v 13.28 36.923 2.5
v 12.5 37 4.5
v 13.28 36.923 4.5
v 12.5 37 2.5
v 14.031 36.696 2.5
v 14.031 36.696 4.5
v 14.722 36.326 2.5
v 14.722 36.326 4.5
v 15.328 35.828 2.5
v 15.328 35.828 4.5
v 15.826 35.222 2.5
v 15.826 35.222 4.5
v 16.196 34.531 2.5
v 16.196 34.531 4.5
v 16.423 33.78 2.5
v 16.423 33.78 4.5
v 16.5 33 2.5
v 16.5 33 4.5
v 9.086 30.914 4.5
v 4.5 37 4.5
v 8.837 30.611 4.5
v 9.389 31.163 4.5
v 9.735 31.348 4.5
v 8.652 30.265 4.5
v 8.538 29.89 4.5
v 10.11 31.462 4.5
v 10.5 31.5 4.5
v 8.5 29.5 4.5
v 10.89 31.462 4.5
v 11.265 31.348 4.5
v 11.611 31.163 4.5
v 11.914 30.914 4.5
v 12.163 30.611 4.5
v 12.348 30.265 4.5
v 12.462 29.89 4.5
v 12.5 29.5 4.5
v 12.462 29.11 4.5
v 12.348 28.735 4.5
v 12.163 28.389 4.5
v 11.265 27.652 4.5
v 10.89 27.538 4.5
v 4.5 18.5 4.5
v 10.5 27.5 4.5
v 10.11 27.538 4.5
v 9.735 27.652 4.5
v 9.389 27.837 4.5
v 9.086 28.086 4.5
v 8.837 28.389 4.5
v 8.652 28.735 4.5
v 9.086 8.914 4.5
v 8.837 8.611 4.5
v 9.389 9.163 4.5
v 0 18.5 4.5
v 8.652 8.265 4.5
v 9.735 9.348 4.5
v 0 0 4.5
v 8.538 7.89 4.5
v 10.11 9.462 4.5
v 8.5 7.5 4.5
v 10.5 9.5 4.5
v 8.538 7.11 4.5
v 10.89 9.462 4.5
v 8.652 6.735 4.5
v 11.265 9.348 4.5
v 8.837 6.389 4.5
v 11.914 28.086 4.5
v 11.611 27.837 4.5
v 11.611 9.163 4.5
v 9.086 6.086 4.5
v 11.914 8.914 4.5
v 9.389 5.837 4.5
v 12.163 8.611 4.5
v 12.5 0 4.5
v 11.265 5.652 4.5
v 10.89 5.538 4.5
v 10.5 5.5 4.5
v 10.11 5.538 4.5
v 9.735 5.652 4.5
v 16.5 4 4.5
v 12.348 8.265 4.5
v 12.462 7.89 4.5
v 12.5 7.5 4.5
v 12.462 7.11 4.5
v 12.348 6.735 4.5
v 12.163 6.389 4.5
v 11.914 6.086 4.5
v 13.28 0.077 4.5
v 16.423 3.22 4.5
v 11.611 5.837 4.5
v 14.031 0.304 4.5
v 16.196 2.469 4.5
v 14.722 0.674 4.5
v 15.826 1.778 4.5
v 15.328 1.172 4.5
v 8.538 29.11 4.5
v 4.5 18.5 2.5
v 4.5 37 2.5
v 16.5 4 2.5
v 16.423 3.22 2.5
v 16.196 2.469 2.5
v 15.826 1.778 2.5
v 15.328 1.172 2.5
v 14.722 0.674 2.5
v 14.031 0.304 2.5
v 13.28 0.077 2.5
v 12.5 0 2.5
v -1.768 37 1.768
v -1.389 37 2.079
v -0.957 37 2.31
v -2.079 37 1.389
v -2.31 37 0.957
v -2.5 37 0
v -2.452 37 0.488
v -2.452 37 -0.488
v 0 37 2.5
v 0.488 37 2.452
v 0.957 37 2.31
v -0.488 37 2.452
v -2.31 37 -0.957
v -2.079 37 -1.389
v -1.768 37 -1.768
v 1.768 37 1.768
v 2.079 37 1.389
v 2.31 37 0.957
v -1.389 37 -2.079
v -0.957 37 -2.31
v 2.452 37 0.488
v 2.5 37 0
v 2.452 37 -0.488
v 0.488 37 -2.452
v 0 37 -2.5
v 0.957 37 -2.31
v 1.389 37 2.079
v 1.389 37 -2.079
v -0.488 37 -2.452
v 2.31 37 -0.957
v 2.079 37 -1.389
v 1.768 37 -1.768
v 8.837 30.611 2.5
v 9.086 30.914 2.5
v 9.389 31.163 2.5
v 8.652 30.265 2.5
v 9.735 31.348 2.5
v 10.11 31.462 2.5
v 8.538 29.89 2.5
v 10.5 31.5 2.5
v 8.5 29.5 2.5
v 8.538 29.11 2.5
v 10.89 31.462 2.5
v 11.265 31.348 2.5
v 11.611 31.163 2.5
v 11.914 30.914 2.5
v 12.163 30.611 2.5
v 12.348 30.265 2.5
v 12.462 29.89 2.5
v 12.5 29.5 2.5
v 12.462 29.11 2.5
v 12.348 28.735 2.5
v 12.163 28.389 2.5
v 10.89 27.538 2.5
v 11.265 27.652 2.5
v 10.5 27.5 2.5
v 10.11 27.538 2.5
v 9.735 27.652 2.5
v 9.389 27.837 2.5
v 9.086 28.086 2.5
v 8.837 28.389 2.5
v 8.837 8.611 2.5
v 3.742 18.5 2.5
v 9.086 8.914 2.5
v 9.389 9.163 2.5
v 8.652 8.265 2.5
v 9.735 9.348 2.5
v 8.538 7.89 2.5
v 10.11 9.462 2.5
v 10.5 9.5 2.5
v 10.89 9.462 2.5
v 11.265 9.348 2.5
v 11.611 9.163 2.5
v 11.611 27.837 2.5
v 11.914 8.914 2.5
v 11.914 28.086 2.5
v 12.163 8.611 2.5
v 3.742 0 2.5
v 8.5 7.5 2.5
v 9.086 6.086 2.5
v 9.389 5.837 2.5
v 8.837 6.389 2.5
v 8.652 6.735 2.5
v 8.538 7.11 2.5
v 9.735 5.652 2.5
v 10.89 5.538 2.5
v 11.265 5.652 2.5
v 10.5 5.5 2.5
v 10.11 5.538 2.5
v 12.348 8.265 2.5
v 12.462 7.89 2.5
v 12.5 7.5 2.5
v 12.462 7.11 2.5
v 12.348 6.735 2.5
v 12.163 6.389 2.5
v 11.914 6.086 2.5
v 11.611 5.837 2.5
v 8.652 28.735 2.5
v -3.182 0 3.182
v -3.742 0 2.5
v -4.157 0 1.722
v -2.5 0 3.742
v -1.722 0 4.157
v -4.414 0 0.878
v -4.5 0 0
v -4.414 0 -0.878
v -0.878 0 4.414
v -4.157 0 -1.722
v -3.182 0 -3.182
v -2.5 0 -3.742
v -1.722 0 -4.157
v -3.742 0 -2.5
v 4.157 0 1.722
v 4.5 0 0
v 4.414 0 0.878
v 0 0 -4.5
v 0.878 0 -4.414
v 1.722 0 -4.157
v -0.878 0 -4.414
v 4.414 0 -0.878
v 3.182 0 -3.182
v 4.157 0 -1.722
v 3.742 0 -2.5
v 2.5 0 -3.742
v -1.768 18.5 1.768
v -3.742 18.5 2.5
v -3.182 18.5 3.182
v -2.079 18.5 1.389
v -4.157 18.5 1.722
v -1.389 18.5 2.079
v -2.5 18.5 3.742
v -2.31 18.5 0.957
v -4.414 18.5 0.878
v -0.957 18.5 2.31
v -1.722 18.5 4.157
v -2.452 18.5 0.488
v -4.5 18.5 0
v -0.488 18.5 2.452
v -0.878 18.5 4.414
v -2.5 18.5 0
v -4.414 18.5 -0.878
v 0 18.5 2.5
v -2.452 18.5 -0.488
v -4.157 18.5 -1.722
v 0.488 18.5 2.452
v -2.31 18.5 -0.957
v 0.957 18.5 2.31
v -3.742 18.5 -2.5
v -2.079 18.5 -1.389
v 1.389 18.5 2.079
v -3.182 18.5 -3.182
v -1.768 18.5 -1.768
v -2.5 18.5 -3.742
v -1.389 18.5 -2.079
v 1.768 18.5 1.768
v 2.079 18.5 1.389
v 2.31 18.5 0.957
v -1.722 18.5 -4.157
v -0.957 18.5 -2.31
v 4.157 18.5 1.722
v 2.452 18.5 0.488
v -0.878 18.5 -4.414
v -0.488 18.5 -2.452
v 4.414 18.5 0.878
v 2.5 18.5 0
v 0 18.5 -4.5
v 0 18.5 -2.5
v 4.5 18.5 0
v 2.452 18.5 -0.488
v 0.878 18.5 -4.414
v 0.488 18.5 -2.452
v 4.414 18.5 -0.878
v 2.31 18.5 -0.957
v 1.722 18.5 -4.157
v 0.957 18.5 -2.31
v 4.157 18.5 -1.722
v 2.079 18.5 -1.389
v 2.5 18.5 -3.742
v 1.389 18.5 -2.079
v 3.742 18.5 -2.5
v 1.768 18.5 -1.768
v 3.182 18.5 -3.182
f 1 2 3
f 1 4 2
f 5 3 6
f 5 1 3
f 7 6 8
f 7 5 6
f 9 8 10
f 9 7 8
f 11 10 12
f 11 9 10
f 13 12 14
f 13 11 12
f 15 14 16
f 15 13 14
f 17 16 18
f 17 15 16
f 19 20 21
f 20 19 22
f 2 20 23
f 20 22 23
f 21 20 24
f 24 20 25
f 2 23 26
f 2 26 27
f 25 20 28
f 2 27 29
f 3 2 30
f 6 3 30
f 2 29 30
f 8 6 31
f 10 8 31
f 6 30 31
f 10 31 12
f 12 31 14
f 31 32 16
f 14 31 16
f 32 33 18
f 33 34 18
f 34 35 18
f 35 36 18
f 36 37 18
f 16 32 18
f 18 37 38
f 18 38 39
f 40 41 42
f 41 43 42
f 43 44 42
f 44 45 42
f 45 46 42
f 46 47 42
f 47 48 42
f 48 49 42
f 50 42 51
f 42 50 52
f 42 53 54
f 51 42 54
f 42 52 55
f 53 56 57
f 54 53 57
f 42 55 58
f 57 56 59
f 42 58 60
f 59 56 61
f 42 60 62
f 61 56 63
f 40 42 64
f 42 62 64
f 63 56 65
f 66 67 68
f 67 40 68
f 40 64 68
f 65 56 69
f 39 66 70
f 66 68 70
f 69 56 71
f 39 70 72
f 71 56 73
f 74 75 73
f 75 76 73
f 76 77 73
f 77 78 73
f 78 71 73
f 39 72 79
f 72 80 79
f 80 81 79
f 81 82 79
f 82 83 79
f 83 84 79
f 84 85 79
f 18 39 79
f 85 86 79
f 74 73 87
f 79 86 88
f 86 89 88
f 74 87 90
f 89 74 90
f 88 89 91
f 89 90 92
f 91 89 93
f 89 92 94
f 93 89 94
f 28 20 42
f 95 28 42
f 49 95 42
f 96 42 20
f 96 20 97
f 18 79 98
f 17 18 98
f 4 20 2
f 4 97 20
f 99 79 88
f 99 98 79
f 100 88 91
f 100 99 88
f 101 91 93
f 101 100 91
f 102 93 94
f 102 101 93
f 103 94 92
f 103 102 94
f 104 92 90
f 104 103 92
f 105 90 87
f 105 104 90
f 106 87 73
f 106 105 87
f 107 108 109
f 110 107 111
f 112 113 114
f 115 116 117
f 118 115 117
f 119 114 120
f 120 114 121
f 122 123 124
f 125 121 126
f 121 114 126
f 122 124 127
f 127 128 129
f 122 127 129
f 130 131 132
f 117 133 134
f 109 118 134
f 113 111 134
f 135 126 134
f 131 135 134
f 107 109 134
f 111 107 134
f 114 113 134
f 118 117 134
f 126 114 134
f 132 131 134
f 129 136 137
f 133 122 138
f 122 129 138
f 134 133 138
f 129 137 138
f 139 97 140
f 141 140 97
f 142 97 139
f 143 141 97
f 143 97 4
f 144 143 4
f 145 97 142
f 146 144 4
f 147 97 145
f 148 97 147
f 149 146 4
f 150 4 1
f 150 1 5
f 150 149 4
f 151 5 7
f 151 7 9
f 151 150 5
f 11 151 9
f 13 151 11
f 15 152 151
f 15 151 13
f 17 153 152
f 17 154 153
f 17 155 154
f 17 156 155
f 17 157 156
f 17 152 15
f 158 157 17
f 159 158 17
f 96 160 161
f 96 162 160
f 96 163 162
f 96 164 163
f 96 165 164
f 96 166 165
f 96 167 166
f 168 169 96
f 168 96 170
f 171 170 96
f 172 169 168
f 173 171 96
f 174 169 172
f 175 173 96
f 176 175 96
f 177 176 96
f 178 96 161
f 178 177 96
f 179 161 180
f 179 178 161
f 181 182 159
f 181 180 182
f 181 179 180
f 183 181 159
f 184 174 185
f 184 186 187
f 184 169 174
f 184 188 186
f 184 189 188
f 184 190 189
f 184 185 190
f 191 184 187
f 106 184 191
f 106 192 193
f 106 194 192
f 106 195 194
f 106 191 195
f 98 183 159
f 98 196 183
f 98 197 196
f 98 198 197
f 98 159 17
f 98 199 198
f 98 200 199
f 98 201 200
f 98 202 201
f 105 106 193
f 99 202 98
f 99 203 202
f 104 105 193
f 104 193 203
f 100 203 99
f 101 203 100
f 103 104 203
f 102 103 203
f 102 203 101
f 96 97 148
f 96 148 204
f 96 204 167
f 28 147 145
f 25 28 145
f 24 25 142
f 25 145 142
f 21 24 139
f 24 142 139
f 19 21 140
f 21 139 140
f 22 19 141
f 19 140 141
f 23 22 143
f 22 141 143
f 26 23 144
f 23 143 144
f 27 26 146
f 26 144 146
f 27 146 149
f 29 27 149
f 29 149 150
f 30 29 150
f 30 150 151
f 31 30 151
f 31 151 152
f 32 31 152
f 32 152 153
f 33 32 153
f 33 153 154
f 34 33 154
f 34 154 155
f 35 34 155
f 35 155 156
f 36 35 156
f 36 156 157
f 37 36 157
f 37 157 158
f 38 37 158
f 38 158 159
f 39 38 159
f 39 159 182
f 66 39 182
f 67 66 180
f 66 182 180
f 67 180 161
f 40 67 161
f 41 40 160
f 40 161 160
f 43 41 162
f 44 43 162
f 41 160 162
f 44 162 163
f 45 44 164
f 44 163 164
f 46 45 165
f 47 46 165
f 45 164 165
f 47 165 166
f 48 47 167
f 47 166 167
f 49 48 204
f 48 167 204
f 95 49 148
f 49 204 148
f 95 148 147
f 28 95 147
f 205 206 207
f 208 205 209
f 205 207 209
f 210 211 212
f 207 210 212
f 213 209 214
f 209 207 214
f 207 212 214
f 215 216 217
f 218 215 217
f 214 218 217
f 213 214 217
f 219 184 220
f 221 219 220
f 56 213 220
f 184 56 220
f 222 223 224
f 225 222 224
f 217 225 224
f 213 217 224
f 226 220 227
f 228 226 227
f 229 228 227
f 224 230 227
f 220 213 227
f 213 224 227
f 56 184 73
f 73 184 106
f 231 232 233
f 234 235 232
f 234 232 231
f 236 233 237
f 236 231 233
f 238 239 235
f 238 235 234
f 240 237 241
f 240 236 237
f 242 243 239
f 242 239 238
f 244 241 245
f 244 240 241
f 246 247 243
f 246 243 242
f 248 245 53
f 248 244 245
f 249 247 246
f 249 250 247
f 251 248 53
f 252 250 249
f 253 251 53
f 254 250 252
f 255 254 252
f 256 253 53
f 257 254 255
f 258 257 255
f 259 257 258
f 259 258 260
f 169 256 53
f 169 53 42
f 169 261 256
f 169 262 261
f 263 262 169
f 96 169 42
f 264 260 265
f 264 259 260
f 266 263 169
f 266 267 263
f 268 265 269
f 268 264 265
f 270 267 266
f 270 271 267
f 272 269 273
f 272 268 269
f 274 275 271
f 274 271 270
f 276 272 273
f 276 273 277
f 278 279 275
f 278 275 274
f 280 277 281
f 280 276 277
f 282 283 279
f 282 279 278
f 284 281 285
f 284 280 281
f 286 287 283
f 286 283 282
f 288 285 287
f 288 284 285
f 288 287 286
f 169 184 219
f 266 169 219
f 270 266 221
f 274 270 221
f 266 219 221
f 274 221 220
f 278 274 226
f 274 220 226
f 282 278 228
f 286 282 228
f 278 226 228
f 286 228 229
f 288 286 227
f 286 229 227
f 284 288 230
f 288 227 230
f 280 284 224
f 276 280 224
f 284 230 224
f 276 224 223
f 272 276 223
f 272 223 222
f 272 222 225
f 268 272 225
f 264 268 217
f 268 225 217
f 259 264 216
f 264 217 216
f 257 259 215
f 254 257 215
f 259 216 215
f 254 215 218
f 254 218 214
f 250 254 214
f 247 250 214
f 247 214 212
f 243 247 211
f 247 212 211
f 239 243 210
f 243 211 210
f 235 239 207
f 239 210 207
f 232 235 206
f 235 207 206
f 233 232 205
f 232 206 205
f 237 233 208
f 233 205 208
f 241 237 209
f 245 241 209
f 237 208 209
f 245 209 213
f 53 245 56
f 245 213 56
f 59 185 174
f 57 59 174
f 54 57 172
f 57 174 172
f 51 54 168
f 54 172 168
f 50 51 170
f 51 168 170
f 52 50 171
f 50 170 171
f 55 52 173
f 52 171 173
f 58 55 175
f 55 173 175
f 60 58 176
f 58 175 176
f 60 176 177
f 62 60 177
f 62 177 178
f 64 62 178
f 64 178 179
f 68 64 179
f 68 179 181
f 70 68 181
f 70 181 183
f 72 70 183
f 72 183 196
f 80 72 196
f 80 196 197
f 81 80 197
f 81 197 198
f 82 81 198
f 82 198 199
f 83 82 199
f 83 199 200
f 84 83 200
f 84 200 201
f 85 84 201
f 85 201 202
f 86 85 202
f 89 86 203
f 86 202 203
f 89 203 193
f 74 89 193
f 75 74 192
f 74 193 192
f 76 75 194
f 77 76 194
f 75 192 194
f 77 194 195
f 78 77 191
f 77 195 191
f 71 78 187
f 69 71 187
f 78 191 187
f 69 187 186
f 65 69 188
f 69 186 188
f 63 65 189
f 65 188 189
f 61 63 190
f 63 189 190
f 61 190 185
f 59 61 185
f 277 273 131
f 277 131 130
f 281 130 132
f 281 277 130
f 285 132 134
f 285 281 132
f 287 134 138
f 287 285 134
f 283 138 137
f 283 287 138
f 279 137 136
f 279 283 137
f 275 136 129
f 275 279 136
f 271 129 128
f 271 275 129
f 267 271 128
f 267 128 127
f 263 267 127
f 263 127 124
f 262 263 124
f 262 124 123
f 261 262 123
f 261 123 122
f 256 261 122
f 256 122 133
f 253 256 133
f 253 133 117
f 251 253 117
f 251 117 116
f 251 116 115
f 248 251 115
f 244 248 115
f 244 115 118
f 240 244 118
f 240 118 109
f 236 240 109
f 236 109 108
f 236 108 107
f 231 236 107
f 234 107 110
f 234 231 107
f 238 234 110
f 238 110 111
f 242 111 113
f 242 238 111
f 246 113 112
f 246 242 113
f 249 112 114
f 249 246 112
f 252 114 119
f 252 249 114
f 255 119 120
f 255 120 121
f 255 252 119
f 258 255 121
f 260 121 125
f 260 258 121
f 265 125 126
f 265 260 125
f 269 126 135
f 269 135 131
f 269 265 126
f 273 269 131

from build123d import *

# Parameters (mm, degrees)
SKETCH_1_R          = 2.5
EXTRUDE_1_DEPTH     = 18.5
SKETCH_2_W          = 12
SKETCH_2_H          = 2
EXTRUDE_2_DEPTH     = 18.5
CUT_EXTRUDE_1_REACH = 43.113
SKETCH_3_R          = 2
FILLET_1_R          = 4
SKETCH_4_R          = 2.5
EXTRUDE_3_DEPTH     = 37


with BuildPart() as part:
    # 草图1 → 凸台-拉伸1 (new body)
    with BuildSketch(Plane(origin=(0, 0, 0), x_dir=(1, 0, 0), z_dir=(0, 1, 0))):
        with BuildLine():
            Line((0, -4.5), (16.5, -4.5))
            Line((16.5, -4.5), (16.5, -2.5))
            Line((16.5, -2.5), (3.741657387, -2.5))
            ThreePointArc((3.741657387, -2.5), (-2.121320344, 3.968626967), (0, -4.5))
        make_face()
        with Locations(Location((0, 0, 0), (0, 0, 270))):
            Circle(SKETCH_1_R, mode=Mode.SUBTRACT)
    extrude(amount=EXTRUDE_1_DEPTH)

    # 草图2 → 凸台-拉伸2 (add)
    with BuildSketch(Plane(origin=(0, 18.5, 0), x_dir=(1, 0, 0), z_dir=(0, 1, 0))):
        with Locations((10.5, -3.5)):
            Rectangle(SKETCH_2_W, SKETCH_2_H)
    extrude(amount=EXTRUDE_2_DEPTH)

    # 草图3 → 切除-拉伸1 (cut, up to next)
    with BuildSketch(Plane(origin=(0, 0, 2.5), x_dir=(-1, 0, 0), z_dir=(0, 0, -1)), mode=Mode.PRIVATE) as cut_extrude_1_sk1:
        with Locations((-10.5, 7.5)):
            Circle(SKETCH_3_R)
    cut_extrude_1_tool1 = extrude(cut_extrude_1_sk1.sketch, amount=-CUT_EXTRUDE_1_REACH, mode=Mode.PRIVATE) & part.part
    # 草图3 → 切除-拉伸1 (cut, up to next)
    with BuildSketch(Plane(origin=(0, 0, 2.5), x_dir=(-1, 0, 0), z_dir=(0, 0, -1)), mode=Mode.PRIVATE) as cut_extrude_1_sk2:
        with Locations((-10.5, 29.5)):
            Circle(SKETCH_3_R)
    cut_extrude_1_tool2 = extrude(cut_extrude_1_sk2.sketch, amount=-CUT_EXTRUDE_1_REACH, mode=Mode.PRIVATE) & part.part
    add(cut_extrude_1_tool1.solids().sort_by_distance((10.5, 7.5, 2.5))[0], mode=Mode.SUBTRACT)
    add(cut_extrude_1_tool2.solids().sort_by_distance((10.5, 29.5, 2.5))[0], mode=Mode.SUBTRACT)

    # 圆角1
    fillet_1_edges = [part.edges().sort_by_distance(p)[0] for p in [
        (16.5, 37, 3.5),
        (16.5, 0, 3.5),
    ]]
    fillet(fillet_1_edges, radius=FILLET_1_R)

    # 草图4 → 凸台-拉伸3 (add)
    with BuildSketch(Plane.XZ):
        with Locations(Location((0, 0, 0), (0, 0, 270))):
            Circle(SKETCH_4_R)
    extrude(amount=-EXTRUDE_3_DEPTH)


solid = part.part
